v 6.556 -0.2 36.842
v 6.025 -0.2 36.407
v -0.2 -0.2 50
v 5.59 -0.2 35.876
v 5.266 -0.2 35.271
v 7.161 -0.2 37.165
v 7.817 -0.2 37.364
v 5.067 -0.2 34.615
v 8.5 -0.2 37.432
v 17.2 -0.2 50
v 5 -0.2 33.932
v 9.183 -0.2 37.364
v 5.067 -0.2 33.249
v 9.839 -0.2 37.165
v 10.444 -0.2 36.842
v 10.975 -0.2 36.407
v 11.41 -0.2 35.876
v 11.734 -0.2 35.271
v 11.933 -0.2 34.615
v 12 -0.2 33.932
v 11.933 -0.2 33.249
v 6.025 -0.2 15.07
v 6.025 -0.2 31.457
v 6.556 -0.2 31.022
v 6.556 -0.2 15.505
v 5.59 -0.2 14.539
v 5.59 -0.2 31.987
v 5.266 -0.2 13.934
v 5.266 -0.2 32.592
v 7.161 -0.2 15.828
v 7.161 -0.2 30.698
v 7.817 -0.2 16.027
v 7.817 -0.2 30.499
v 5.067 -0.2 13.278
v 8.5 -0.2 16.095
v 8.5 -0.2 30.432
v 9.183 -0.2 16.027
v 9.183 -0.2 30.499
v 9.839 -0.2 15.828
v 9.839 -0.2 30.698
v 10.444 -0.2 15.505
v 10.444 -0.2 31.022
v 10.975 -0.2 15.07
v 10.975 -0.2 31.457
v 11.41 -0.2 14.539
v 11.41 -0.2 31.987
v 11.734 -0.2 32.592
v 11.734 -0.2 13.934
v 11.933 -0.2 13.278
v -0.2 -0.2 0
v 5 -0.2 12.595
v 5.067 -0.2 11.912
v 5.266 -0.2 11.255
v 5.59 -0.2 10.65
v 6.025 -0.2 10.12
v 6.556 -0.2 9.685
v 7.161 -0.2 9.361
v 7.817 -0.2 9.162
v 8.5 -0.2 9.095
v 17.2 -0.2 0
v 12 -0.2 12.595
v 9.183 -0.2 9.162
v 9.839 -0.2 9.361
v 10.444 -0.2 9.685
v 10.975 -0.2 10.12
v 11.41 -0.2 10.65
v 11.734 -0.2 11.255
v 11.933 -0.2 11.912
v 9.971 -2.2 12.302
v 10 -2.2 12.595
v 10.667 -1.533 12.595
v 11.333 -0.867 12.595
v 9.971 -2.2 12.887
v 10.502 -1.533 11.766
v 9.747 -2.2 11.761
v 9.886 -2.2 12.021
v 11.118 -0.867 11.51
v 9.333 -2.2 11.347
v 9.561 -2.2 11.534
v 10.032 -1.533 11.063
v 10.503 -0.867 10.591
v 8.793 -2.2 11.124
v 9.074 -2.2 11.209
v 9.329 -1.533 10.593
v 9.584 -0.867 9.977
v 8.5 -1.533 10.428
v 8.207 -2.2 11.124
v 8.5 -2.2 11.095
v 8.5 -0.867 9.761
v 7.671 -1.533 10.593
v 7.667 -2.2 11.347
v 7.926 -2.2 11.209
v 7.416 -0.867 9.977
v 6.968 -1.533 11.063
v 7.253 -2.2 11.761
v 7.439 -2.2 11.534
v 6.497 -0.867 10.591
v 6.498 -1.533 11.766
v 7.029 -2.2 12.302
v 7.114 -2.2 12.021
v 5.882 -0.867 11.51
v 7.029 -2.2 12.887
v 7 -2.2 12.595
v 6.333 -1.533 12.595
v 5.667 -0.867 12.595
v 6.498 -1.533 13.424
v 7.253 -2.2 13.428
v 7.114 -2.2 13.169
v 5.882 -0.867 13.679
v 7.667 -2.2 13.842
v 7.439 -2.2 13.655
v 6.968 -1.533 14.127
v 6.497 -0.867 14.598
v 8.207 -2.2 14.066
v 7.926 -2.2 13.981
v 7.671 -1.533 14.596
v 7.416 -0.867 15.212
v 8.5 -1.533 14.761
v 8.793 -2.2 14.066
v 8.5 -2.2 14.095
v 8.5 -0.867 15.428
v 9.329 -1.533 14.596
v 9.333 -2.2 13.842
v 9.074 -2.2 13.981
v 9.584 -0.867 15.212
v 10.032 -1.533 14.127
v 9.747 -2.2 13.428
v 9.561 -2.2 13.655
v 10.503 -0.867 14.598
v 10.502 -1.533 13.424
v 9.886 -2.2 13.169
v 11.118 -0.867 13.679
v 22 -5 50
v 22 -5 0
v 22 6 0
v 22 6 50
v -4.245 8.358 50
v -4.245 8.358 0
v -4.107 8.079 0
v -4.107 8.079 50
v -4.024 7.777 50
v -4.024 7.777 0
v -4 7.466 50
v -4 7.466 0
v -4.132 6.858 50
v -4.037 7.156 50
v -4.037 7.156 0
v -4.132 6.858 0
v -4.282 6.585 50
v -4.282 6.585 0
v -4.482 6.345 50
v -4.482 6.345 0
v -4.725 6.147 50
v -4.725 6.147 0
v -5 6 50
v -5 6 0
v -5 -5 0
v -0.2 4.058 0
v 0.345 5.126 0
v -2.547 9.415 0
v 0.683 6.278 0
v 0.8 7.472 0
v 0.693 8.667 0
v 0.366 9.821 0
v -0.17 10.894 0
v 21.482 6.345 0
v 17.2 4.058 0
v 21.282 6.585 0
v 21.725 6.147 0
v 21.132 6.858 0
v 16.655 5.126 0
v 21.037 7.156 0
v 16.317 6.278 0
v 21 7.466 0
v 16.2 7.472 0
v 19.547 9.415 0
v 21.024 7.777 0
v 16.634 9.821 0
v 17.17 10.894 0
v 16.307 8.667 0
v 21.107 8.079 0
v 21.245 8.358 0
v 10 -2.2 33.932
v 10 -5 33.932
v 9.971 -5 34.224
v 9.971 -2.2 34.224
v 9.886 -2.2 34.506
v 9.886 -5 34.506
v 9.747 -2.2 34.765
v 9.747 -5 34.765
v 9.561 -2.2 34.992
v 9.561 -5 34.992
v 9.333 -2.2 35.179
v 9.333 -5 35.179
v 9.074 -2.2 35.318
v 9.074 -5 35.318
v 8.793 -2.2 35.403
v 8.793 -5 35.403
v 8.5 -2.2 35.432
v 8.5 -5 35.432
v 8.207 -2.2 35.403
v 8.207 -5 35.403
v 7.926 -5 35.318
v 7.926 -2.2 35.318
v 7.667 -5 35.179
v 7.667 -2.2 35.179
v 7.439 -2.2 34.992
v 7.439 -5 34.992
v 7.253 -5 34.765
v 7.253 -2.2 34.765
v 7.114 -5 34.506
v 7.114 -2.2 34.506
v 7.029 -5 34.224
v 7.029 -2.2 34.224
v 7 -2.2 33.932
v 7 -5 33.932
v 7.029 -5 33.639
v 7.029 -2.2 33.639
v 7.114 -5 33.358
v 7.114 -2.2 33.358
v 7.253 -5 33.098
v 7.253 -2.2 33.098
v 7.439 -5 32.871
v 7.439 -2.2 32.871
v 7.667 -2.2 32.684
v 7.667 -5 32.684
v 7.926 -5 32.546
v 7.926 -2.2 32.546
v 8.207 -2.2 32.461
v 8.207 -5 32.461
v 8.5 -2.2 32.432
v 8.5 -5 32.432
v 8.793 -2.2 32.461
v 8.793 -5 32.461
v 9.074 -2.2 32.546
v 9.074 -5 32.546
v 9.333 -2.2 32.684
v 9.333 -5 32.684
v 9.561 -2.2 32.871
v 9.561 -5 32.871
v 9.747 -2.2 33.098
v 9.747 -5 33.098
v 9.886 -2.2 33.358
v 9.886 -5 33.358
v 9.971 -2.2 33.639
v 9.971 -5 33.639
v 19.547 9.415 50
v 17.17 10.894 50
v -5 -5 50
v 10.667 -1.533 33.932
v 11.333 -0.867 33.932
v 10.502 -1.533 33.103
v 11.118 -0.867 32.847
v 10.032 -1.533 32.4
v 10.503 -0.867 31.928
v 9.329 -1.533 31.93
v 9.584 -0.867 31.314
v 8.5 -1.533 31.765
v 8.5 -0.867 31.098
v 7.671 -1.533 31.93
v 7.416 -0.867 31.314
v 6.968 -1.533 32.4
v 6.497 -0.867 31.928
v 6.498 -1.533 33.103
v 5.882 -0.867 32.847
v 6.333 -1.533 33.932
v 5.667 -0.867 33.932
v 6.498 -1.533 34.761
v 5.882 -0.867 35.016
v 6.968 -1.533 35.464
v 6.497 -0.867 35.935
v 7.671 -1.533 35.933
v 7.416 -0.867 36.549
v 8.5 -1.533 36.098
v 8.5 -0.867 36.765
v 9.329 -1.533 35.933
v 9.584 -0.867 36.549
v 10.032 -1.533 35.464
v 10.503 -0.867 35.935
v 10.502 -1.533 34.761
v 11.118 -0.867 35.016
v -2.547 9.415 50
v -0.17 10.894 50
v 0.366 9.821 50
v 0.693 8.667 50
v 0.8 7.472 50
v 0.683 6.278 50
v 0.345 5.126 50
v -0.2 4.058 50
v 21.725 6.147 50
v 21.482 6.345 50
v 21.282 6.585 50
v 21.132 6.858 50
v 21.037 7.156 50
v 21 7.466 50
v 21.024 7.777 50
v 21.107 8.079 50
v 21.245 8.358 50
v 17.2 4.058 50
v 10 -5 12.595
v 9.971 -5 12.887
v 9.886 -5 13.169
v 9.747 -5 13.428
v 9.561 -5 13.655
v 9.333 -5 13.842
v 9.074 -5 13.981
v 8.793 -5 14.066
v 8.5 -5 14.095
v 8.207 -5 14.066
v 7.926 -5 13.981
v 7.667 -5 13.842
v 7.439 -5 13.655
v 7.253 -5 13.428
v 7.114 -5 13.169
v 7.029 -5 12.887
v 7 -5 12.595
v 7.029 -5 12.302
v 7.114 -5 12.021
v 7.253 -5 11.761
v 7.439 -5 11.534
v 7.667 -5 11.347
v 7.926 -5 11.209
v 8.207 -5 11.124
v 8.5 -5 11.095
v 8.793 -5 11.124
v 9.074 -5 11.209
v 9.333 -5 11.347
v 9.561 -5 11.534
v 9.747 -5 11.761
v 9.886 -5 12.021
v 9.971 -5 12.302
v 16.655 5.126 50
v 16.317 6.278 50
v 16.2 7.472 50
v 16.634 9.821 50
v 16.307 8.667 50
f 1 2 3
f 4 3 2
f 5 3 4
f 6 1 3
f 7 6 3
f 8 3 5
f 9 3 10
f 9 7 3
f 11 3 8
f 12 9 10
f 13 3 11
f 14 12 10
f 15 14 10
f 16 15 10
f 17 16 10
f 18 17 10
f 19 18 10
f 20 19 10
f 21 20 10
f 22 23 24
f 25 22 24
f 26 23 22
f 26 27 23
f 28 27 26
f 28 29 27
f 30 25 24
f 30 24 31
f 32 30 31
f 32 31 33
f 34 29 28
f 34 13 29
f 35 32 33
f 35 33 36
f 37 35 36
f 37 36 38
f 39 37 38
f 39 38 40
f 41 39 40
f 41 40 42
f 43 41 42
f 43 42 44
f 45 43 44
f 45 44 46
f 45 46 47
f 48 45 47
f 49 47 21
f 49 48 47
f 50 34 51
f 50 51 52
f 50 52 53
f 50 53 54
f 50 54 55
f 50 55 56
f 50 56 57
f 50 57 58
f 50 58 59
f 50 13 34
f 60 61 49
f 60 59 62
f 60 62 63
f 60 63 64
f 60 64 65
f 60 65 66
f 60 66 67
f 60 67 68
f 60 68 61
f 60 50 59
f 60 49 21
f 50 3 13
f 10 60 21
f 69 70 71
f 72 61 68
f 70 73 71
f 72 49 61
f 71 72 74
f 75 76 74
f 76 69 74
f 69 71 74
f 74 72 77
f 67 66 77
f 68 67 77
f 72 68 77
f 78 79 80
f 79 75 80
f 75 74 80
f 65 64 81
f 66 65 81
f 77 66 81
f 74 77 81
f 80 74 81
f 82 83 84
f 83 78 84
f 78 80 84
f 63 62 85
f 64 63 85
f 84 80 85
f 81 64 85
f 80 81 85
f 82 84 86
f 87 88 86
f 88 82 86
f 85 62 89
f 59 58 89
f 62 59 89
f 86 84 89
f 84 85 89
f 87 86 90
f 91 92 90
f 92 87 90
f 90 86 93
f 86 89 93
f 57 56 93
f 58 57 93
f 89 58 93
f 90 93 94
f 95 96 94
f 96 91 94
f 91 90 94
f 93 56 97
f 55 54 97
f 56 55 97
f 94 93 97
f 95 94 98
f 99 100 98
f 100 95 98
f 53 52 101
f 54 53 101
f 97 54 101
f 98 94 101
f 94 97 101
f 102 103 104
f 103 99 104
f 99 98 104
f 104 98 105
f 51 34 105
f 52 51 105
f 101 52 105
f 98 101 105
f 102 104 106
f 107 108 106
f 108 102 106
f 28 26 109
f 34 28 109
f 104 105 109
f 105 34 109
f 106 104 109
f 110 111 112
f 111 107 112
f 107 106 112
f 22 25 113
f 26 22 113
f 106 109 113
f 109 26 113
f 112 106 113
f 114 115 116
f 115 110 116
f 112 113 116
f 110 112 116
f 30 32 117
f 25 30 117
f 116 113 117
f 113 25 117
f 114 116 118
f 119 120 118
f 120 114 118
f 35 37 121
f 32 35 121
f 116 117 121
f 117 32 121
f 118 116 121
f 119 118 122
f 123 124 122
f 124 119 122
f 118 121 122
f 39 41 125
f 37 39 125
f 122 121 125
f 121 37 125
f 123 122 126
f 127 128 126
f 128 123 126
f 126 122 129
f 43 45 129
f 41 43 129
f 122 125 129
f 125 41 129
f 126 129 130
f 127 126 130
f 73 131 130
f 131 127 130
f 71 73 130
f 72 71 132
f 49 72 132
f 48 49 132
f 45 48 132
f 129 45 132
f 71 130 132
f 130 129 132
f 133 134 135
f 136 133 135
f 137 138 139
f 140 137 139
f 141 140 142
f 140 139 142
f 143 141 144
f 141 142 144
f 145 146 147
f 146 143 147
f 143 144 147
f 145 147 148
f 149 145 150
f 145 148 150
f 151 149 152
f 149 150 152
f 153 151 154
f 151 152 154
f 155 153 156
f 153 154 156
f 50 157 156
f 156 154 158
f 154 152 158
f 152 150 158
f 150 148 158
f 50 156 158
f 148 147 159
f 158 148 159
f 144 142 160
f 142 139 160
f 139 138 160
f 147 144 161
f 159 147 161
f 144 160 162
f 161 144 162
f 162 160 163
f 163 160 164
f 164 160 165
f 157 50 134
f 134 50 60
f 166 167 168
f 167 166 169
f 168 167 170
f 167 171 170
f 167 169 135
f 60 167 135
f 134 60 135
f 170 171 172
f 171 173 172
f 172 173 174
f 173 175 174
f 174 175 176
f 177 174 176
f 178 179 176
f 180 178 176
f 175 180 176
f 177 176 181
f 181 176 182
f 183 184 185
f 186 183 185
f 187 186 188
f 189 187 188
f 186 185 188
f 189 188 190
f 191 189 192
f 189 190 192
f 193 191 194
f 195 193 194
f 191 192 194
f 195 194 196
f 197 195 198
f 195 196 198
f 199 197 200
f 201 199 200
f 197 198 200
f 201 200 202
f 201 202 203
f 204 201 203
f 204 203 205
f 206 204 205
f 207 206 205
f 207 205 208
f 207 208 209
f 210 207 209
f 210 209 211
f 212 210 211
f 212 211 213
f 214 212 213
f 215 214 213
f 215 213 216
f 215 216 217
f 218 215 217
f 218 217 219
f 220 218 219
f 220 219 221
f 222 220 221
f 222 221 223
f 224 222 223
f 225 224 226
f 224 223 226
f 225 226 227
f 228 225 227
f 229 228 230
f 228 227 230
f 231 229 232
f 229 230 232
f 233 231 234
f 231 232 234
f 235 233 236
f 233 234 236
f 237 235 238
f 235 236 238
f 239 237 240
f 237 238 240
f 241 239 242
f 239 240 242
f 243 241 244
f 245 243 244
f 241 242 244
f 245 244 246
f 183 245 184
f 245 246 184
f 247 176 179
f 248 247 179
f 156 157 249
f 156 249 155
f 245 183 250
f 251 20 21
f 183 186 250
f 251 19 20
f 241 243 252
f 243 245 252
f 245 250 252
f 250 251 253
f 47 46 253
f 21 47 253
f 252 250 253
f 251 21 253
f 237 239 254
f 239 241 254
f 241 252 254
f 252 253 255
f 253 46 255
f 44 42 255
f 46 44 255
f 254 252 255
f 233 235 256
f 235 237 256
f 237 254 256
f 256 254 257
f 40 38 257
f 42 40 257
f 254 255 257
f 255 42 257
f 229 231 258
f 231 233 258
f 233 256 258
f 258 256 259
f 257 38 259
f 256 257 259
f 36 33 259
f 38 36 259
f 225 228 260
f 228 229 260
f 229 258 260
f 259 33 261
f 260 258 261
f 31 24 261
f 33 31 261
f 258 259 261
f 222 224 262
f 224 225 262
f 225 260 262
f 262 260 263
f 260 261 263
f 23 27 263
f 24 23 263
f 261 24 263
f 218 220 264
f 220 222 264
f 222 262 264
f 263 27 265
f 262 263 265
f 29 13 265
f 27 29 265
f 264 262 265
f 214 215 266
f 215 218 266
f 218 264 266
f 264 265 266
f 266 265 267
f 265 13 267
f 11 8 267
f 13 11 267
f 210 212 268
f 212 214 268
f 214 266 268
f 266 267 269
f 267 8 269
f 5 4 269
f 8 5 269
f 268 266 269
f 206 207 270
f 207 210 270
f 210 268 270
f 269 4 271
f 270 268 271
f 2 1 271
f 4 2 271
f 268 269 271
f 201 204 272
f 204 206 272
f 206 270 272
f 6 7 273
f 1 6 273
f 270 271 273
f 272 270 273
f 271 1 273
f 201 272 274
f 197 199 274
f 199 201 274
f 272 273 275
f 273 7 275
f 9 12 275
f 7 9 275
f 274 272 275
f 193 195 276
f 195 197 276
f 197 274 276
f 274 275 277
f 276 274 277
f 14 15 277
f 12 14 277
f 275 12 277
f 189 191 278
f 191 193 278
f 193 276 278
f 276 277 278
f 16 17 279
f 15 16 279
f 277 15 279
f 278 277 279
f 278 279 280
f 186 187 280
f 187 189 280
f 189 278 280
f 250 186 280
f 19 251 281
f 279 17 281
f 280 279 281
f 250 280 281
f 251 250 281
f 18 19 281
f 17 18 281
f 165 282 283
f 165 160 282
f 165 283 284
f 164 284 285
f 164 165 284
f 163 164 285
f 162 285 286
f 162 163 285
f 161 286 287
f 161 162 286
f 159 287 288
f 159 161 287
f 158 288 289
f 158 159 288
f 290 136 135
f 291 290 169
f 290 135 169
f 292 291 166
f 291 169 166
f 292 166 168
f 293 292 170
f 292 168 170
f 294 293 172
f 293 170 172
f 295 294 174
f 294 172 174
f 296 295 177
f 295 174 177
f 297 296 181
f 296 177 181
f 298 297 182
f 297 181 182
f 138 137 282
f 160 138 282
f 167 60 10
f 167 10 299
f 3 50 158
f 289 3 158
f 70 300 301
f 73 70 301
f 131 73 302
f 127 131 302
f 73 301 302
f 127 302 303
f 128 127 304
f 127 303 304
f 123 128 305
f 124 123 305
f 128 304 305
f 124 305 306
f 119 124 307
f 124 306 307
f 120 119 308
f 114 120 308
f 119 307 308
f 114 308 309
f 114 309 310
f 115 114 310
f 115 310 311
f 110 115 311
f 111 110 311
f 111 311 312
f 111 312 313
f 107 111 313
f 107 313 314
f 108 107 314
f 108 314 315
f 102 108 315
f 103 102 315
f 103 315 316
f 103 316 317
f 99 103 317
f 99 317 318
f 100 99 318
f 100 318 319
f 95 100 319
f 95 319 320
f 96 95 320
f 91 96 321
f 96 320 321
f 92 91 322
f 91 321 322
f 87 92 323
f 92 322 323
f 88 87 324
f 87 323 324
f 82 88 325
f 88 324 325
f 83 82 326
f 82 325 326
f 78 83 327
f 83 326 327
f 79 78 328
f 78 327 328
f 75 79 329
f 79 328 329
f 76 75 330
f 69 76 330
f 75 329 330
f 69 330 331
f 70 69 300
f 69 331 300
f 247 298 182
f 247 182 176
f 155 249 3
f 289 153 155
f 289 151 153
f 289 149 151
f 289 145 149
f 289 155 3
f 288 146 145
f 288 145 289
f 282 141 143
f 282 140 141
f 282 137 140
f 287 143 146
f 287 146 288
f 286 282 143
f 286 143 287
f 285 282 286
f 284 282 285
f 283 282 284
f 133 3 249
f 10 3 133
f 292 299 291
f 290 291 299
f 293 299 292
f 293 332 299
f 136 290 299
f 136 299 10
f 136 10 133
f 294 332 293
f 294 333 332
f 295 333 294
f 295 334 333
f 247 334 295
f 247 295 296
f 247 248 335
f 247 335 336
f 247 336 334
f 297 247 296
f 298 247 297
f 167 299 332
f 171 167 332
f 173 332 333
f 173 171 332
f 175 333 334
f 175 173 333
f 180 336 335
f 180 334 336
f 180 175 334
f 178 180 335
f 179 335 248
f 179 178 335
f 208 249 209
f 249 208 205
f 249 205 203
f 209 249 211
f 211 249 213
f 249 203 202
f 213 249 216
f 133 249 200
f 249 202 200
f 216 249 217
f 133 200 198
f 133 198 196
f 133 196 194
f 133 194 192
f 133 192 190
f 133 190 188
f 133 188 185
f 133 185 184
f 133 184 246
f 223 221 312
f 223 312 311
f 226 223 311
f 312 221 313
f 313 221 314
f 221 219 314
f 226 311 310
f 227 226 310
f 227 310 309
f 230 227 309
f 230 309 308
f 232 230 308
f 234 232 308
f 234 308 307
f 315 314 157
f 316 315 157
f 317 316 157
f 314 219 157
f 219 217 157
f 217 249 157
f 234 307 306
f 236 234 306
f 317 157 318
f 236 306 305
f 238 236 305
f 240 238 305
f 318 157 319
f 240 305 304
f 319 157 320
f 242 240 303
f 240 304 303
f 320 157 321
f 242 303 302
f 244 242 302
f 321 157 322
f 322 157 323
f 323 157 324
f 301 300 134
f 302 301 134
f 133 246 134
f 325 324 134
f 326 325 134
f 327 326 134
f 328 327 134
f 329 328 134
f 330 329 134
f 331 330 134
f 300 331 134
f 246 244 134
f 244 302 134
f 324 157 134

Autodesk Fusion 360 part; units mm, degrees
sketch "Sketch1" plane through (0, 0, 0) normal (0, 0, 1) x (1, 0, 0)
  line L0 (0, 0) -> (17, 0)
  line L1 (0, 0) -> (0, 4)
  line L2 (17, 0) -> (17, 4)
  arc A0 (0, 4) -> (0, 11) centre (-5.625, 7.5) ccw
  arc A1 (17, 11) -> (17, 4) centre (22.625, 7.5) ccw
  line L3 (0, 11) -> (17, 11)
  arc A2 (17.1698, 10.8943) -> (17.2, 4.0576) centre (22.625, 7.5) ccw
  line L4 (17.2, -0.2) -> (17.2, 4.0576)
  line L5 (-0.2, -0.2) -> (17.2, -0.2)
  line L6 (-0.2, -0.2) -> (-0.2, 4.0576)
  arc A3 (-0.2, 4.0576) -> (-0.1698, 10.8943) centre (-5.625, 7.5) ccw
  arc A4 (19.5472, 9.4151) -> (20, 5) centre (22.625, 7.5) ccw
  line L7 (20, -3) -> (20, 5)
  line L8 (-3, -3) -> (20, -3)
  line L9 (-3, -3) -> (-3, 5)
  arc A5 (-3, 5) -> (-2.5472, 9.4151) centre (-5.625, 7.5) ccw
  line L10 (-2.5472, 9.4151) -> (-0.1698, 10.8943)
  line L11 (19.5472, 9.4151) -> (17.1698, 10.8943)
  arc A6 (21.2453, 8.3585) -> (22, 6) centre (22.625, 7.5) ccw
  line L12 (22, -5) -> (22, 6)
  line L13 (-5, -5) -> (22, -5)
  line L14 (-5, -5) -> (-5, 6)
  arc A7 (-5, 6) -> (-4.2453, 8.3585) centre (-5.625, 7.5) ccw
  line L15 (-4.2453, 8.3585) -> (0, 11)
  line L16 (21.2453, 8.3585) -> (17, 11)
  point P0 (0, 11)
  point P1 (17, 11)
  point P2 (1, 7.5)
  point P3 (16, 7.5)
  dimension "d1" = 17
  dimension "d2" = 4
  dimension "d3" = 4
  dimension "d4" = 11
  dimension "d5" = 11
  dimension "d6" = 15
  dimension "d7" = 1
  dimension "d8" = 3.5
  dimension "d9" = 3.5
  dimension "d10" = 0.2
  dimension "d11" = 3
  dimension "d21" = -5
extrude "Extrude1" add sketch "Sketch1" along normal blind 50 contours A2 L4 L5 L6 A3 A4 L7 L8 L9 A5 L10 L11 L15 L16 | A4 L7 L8 L9 A5 A6 L12 L13 L14 A7 L15 L16
sketch "Sketch4" plane through (0, -5, 0) normal (0, -1, 0) x (1, 0, 0)
  line L0 (-5, 0) -> (22, 0)
  line L1 (22, 0) -> (22, 50)
  line L2 (22, 50) -> (-5, 50)
  line L3 (-5, 50) -> (-5, 0)
  circle A0 centre (8.5, 33.9317) radius 1.5
  circle A1 centre (8.5, 12.5947) radius 1.5
  dimension "d25" = 3
  dimension "d26" = 3
  dimension "d27" = 21.337
  dimension "d28" = 13.5
  dimension "d29" = 13.5
extrude "Extrude3" cut sketch "Sketch4" against normal blind 4.8 contours A0 | A1
chamfer "Chamfer4" distance 2 angle 45 2 edges at (7.1015, -0.2, 33.3893) (7.1015, -0.2, 12.0523)
equation "d28 = ( 27 / 2 ) * 1 mm"
equation "d29 = ( 27 / 2 ) * 1 mm"
